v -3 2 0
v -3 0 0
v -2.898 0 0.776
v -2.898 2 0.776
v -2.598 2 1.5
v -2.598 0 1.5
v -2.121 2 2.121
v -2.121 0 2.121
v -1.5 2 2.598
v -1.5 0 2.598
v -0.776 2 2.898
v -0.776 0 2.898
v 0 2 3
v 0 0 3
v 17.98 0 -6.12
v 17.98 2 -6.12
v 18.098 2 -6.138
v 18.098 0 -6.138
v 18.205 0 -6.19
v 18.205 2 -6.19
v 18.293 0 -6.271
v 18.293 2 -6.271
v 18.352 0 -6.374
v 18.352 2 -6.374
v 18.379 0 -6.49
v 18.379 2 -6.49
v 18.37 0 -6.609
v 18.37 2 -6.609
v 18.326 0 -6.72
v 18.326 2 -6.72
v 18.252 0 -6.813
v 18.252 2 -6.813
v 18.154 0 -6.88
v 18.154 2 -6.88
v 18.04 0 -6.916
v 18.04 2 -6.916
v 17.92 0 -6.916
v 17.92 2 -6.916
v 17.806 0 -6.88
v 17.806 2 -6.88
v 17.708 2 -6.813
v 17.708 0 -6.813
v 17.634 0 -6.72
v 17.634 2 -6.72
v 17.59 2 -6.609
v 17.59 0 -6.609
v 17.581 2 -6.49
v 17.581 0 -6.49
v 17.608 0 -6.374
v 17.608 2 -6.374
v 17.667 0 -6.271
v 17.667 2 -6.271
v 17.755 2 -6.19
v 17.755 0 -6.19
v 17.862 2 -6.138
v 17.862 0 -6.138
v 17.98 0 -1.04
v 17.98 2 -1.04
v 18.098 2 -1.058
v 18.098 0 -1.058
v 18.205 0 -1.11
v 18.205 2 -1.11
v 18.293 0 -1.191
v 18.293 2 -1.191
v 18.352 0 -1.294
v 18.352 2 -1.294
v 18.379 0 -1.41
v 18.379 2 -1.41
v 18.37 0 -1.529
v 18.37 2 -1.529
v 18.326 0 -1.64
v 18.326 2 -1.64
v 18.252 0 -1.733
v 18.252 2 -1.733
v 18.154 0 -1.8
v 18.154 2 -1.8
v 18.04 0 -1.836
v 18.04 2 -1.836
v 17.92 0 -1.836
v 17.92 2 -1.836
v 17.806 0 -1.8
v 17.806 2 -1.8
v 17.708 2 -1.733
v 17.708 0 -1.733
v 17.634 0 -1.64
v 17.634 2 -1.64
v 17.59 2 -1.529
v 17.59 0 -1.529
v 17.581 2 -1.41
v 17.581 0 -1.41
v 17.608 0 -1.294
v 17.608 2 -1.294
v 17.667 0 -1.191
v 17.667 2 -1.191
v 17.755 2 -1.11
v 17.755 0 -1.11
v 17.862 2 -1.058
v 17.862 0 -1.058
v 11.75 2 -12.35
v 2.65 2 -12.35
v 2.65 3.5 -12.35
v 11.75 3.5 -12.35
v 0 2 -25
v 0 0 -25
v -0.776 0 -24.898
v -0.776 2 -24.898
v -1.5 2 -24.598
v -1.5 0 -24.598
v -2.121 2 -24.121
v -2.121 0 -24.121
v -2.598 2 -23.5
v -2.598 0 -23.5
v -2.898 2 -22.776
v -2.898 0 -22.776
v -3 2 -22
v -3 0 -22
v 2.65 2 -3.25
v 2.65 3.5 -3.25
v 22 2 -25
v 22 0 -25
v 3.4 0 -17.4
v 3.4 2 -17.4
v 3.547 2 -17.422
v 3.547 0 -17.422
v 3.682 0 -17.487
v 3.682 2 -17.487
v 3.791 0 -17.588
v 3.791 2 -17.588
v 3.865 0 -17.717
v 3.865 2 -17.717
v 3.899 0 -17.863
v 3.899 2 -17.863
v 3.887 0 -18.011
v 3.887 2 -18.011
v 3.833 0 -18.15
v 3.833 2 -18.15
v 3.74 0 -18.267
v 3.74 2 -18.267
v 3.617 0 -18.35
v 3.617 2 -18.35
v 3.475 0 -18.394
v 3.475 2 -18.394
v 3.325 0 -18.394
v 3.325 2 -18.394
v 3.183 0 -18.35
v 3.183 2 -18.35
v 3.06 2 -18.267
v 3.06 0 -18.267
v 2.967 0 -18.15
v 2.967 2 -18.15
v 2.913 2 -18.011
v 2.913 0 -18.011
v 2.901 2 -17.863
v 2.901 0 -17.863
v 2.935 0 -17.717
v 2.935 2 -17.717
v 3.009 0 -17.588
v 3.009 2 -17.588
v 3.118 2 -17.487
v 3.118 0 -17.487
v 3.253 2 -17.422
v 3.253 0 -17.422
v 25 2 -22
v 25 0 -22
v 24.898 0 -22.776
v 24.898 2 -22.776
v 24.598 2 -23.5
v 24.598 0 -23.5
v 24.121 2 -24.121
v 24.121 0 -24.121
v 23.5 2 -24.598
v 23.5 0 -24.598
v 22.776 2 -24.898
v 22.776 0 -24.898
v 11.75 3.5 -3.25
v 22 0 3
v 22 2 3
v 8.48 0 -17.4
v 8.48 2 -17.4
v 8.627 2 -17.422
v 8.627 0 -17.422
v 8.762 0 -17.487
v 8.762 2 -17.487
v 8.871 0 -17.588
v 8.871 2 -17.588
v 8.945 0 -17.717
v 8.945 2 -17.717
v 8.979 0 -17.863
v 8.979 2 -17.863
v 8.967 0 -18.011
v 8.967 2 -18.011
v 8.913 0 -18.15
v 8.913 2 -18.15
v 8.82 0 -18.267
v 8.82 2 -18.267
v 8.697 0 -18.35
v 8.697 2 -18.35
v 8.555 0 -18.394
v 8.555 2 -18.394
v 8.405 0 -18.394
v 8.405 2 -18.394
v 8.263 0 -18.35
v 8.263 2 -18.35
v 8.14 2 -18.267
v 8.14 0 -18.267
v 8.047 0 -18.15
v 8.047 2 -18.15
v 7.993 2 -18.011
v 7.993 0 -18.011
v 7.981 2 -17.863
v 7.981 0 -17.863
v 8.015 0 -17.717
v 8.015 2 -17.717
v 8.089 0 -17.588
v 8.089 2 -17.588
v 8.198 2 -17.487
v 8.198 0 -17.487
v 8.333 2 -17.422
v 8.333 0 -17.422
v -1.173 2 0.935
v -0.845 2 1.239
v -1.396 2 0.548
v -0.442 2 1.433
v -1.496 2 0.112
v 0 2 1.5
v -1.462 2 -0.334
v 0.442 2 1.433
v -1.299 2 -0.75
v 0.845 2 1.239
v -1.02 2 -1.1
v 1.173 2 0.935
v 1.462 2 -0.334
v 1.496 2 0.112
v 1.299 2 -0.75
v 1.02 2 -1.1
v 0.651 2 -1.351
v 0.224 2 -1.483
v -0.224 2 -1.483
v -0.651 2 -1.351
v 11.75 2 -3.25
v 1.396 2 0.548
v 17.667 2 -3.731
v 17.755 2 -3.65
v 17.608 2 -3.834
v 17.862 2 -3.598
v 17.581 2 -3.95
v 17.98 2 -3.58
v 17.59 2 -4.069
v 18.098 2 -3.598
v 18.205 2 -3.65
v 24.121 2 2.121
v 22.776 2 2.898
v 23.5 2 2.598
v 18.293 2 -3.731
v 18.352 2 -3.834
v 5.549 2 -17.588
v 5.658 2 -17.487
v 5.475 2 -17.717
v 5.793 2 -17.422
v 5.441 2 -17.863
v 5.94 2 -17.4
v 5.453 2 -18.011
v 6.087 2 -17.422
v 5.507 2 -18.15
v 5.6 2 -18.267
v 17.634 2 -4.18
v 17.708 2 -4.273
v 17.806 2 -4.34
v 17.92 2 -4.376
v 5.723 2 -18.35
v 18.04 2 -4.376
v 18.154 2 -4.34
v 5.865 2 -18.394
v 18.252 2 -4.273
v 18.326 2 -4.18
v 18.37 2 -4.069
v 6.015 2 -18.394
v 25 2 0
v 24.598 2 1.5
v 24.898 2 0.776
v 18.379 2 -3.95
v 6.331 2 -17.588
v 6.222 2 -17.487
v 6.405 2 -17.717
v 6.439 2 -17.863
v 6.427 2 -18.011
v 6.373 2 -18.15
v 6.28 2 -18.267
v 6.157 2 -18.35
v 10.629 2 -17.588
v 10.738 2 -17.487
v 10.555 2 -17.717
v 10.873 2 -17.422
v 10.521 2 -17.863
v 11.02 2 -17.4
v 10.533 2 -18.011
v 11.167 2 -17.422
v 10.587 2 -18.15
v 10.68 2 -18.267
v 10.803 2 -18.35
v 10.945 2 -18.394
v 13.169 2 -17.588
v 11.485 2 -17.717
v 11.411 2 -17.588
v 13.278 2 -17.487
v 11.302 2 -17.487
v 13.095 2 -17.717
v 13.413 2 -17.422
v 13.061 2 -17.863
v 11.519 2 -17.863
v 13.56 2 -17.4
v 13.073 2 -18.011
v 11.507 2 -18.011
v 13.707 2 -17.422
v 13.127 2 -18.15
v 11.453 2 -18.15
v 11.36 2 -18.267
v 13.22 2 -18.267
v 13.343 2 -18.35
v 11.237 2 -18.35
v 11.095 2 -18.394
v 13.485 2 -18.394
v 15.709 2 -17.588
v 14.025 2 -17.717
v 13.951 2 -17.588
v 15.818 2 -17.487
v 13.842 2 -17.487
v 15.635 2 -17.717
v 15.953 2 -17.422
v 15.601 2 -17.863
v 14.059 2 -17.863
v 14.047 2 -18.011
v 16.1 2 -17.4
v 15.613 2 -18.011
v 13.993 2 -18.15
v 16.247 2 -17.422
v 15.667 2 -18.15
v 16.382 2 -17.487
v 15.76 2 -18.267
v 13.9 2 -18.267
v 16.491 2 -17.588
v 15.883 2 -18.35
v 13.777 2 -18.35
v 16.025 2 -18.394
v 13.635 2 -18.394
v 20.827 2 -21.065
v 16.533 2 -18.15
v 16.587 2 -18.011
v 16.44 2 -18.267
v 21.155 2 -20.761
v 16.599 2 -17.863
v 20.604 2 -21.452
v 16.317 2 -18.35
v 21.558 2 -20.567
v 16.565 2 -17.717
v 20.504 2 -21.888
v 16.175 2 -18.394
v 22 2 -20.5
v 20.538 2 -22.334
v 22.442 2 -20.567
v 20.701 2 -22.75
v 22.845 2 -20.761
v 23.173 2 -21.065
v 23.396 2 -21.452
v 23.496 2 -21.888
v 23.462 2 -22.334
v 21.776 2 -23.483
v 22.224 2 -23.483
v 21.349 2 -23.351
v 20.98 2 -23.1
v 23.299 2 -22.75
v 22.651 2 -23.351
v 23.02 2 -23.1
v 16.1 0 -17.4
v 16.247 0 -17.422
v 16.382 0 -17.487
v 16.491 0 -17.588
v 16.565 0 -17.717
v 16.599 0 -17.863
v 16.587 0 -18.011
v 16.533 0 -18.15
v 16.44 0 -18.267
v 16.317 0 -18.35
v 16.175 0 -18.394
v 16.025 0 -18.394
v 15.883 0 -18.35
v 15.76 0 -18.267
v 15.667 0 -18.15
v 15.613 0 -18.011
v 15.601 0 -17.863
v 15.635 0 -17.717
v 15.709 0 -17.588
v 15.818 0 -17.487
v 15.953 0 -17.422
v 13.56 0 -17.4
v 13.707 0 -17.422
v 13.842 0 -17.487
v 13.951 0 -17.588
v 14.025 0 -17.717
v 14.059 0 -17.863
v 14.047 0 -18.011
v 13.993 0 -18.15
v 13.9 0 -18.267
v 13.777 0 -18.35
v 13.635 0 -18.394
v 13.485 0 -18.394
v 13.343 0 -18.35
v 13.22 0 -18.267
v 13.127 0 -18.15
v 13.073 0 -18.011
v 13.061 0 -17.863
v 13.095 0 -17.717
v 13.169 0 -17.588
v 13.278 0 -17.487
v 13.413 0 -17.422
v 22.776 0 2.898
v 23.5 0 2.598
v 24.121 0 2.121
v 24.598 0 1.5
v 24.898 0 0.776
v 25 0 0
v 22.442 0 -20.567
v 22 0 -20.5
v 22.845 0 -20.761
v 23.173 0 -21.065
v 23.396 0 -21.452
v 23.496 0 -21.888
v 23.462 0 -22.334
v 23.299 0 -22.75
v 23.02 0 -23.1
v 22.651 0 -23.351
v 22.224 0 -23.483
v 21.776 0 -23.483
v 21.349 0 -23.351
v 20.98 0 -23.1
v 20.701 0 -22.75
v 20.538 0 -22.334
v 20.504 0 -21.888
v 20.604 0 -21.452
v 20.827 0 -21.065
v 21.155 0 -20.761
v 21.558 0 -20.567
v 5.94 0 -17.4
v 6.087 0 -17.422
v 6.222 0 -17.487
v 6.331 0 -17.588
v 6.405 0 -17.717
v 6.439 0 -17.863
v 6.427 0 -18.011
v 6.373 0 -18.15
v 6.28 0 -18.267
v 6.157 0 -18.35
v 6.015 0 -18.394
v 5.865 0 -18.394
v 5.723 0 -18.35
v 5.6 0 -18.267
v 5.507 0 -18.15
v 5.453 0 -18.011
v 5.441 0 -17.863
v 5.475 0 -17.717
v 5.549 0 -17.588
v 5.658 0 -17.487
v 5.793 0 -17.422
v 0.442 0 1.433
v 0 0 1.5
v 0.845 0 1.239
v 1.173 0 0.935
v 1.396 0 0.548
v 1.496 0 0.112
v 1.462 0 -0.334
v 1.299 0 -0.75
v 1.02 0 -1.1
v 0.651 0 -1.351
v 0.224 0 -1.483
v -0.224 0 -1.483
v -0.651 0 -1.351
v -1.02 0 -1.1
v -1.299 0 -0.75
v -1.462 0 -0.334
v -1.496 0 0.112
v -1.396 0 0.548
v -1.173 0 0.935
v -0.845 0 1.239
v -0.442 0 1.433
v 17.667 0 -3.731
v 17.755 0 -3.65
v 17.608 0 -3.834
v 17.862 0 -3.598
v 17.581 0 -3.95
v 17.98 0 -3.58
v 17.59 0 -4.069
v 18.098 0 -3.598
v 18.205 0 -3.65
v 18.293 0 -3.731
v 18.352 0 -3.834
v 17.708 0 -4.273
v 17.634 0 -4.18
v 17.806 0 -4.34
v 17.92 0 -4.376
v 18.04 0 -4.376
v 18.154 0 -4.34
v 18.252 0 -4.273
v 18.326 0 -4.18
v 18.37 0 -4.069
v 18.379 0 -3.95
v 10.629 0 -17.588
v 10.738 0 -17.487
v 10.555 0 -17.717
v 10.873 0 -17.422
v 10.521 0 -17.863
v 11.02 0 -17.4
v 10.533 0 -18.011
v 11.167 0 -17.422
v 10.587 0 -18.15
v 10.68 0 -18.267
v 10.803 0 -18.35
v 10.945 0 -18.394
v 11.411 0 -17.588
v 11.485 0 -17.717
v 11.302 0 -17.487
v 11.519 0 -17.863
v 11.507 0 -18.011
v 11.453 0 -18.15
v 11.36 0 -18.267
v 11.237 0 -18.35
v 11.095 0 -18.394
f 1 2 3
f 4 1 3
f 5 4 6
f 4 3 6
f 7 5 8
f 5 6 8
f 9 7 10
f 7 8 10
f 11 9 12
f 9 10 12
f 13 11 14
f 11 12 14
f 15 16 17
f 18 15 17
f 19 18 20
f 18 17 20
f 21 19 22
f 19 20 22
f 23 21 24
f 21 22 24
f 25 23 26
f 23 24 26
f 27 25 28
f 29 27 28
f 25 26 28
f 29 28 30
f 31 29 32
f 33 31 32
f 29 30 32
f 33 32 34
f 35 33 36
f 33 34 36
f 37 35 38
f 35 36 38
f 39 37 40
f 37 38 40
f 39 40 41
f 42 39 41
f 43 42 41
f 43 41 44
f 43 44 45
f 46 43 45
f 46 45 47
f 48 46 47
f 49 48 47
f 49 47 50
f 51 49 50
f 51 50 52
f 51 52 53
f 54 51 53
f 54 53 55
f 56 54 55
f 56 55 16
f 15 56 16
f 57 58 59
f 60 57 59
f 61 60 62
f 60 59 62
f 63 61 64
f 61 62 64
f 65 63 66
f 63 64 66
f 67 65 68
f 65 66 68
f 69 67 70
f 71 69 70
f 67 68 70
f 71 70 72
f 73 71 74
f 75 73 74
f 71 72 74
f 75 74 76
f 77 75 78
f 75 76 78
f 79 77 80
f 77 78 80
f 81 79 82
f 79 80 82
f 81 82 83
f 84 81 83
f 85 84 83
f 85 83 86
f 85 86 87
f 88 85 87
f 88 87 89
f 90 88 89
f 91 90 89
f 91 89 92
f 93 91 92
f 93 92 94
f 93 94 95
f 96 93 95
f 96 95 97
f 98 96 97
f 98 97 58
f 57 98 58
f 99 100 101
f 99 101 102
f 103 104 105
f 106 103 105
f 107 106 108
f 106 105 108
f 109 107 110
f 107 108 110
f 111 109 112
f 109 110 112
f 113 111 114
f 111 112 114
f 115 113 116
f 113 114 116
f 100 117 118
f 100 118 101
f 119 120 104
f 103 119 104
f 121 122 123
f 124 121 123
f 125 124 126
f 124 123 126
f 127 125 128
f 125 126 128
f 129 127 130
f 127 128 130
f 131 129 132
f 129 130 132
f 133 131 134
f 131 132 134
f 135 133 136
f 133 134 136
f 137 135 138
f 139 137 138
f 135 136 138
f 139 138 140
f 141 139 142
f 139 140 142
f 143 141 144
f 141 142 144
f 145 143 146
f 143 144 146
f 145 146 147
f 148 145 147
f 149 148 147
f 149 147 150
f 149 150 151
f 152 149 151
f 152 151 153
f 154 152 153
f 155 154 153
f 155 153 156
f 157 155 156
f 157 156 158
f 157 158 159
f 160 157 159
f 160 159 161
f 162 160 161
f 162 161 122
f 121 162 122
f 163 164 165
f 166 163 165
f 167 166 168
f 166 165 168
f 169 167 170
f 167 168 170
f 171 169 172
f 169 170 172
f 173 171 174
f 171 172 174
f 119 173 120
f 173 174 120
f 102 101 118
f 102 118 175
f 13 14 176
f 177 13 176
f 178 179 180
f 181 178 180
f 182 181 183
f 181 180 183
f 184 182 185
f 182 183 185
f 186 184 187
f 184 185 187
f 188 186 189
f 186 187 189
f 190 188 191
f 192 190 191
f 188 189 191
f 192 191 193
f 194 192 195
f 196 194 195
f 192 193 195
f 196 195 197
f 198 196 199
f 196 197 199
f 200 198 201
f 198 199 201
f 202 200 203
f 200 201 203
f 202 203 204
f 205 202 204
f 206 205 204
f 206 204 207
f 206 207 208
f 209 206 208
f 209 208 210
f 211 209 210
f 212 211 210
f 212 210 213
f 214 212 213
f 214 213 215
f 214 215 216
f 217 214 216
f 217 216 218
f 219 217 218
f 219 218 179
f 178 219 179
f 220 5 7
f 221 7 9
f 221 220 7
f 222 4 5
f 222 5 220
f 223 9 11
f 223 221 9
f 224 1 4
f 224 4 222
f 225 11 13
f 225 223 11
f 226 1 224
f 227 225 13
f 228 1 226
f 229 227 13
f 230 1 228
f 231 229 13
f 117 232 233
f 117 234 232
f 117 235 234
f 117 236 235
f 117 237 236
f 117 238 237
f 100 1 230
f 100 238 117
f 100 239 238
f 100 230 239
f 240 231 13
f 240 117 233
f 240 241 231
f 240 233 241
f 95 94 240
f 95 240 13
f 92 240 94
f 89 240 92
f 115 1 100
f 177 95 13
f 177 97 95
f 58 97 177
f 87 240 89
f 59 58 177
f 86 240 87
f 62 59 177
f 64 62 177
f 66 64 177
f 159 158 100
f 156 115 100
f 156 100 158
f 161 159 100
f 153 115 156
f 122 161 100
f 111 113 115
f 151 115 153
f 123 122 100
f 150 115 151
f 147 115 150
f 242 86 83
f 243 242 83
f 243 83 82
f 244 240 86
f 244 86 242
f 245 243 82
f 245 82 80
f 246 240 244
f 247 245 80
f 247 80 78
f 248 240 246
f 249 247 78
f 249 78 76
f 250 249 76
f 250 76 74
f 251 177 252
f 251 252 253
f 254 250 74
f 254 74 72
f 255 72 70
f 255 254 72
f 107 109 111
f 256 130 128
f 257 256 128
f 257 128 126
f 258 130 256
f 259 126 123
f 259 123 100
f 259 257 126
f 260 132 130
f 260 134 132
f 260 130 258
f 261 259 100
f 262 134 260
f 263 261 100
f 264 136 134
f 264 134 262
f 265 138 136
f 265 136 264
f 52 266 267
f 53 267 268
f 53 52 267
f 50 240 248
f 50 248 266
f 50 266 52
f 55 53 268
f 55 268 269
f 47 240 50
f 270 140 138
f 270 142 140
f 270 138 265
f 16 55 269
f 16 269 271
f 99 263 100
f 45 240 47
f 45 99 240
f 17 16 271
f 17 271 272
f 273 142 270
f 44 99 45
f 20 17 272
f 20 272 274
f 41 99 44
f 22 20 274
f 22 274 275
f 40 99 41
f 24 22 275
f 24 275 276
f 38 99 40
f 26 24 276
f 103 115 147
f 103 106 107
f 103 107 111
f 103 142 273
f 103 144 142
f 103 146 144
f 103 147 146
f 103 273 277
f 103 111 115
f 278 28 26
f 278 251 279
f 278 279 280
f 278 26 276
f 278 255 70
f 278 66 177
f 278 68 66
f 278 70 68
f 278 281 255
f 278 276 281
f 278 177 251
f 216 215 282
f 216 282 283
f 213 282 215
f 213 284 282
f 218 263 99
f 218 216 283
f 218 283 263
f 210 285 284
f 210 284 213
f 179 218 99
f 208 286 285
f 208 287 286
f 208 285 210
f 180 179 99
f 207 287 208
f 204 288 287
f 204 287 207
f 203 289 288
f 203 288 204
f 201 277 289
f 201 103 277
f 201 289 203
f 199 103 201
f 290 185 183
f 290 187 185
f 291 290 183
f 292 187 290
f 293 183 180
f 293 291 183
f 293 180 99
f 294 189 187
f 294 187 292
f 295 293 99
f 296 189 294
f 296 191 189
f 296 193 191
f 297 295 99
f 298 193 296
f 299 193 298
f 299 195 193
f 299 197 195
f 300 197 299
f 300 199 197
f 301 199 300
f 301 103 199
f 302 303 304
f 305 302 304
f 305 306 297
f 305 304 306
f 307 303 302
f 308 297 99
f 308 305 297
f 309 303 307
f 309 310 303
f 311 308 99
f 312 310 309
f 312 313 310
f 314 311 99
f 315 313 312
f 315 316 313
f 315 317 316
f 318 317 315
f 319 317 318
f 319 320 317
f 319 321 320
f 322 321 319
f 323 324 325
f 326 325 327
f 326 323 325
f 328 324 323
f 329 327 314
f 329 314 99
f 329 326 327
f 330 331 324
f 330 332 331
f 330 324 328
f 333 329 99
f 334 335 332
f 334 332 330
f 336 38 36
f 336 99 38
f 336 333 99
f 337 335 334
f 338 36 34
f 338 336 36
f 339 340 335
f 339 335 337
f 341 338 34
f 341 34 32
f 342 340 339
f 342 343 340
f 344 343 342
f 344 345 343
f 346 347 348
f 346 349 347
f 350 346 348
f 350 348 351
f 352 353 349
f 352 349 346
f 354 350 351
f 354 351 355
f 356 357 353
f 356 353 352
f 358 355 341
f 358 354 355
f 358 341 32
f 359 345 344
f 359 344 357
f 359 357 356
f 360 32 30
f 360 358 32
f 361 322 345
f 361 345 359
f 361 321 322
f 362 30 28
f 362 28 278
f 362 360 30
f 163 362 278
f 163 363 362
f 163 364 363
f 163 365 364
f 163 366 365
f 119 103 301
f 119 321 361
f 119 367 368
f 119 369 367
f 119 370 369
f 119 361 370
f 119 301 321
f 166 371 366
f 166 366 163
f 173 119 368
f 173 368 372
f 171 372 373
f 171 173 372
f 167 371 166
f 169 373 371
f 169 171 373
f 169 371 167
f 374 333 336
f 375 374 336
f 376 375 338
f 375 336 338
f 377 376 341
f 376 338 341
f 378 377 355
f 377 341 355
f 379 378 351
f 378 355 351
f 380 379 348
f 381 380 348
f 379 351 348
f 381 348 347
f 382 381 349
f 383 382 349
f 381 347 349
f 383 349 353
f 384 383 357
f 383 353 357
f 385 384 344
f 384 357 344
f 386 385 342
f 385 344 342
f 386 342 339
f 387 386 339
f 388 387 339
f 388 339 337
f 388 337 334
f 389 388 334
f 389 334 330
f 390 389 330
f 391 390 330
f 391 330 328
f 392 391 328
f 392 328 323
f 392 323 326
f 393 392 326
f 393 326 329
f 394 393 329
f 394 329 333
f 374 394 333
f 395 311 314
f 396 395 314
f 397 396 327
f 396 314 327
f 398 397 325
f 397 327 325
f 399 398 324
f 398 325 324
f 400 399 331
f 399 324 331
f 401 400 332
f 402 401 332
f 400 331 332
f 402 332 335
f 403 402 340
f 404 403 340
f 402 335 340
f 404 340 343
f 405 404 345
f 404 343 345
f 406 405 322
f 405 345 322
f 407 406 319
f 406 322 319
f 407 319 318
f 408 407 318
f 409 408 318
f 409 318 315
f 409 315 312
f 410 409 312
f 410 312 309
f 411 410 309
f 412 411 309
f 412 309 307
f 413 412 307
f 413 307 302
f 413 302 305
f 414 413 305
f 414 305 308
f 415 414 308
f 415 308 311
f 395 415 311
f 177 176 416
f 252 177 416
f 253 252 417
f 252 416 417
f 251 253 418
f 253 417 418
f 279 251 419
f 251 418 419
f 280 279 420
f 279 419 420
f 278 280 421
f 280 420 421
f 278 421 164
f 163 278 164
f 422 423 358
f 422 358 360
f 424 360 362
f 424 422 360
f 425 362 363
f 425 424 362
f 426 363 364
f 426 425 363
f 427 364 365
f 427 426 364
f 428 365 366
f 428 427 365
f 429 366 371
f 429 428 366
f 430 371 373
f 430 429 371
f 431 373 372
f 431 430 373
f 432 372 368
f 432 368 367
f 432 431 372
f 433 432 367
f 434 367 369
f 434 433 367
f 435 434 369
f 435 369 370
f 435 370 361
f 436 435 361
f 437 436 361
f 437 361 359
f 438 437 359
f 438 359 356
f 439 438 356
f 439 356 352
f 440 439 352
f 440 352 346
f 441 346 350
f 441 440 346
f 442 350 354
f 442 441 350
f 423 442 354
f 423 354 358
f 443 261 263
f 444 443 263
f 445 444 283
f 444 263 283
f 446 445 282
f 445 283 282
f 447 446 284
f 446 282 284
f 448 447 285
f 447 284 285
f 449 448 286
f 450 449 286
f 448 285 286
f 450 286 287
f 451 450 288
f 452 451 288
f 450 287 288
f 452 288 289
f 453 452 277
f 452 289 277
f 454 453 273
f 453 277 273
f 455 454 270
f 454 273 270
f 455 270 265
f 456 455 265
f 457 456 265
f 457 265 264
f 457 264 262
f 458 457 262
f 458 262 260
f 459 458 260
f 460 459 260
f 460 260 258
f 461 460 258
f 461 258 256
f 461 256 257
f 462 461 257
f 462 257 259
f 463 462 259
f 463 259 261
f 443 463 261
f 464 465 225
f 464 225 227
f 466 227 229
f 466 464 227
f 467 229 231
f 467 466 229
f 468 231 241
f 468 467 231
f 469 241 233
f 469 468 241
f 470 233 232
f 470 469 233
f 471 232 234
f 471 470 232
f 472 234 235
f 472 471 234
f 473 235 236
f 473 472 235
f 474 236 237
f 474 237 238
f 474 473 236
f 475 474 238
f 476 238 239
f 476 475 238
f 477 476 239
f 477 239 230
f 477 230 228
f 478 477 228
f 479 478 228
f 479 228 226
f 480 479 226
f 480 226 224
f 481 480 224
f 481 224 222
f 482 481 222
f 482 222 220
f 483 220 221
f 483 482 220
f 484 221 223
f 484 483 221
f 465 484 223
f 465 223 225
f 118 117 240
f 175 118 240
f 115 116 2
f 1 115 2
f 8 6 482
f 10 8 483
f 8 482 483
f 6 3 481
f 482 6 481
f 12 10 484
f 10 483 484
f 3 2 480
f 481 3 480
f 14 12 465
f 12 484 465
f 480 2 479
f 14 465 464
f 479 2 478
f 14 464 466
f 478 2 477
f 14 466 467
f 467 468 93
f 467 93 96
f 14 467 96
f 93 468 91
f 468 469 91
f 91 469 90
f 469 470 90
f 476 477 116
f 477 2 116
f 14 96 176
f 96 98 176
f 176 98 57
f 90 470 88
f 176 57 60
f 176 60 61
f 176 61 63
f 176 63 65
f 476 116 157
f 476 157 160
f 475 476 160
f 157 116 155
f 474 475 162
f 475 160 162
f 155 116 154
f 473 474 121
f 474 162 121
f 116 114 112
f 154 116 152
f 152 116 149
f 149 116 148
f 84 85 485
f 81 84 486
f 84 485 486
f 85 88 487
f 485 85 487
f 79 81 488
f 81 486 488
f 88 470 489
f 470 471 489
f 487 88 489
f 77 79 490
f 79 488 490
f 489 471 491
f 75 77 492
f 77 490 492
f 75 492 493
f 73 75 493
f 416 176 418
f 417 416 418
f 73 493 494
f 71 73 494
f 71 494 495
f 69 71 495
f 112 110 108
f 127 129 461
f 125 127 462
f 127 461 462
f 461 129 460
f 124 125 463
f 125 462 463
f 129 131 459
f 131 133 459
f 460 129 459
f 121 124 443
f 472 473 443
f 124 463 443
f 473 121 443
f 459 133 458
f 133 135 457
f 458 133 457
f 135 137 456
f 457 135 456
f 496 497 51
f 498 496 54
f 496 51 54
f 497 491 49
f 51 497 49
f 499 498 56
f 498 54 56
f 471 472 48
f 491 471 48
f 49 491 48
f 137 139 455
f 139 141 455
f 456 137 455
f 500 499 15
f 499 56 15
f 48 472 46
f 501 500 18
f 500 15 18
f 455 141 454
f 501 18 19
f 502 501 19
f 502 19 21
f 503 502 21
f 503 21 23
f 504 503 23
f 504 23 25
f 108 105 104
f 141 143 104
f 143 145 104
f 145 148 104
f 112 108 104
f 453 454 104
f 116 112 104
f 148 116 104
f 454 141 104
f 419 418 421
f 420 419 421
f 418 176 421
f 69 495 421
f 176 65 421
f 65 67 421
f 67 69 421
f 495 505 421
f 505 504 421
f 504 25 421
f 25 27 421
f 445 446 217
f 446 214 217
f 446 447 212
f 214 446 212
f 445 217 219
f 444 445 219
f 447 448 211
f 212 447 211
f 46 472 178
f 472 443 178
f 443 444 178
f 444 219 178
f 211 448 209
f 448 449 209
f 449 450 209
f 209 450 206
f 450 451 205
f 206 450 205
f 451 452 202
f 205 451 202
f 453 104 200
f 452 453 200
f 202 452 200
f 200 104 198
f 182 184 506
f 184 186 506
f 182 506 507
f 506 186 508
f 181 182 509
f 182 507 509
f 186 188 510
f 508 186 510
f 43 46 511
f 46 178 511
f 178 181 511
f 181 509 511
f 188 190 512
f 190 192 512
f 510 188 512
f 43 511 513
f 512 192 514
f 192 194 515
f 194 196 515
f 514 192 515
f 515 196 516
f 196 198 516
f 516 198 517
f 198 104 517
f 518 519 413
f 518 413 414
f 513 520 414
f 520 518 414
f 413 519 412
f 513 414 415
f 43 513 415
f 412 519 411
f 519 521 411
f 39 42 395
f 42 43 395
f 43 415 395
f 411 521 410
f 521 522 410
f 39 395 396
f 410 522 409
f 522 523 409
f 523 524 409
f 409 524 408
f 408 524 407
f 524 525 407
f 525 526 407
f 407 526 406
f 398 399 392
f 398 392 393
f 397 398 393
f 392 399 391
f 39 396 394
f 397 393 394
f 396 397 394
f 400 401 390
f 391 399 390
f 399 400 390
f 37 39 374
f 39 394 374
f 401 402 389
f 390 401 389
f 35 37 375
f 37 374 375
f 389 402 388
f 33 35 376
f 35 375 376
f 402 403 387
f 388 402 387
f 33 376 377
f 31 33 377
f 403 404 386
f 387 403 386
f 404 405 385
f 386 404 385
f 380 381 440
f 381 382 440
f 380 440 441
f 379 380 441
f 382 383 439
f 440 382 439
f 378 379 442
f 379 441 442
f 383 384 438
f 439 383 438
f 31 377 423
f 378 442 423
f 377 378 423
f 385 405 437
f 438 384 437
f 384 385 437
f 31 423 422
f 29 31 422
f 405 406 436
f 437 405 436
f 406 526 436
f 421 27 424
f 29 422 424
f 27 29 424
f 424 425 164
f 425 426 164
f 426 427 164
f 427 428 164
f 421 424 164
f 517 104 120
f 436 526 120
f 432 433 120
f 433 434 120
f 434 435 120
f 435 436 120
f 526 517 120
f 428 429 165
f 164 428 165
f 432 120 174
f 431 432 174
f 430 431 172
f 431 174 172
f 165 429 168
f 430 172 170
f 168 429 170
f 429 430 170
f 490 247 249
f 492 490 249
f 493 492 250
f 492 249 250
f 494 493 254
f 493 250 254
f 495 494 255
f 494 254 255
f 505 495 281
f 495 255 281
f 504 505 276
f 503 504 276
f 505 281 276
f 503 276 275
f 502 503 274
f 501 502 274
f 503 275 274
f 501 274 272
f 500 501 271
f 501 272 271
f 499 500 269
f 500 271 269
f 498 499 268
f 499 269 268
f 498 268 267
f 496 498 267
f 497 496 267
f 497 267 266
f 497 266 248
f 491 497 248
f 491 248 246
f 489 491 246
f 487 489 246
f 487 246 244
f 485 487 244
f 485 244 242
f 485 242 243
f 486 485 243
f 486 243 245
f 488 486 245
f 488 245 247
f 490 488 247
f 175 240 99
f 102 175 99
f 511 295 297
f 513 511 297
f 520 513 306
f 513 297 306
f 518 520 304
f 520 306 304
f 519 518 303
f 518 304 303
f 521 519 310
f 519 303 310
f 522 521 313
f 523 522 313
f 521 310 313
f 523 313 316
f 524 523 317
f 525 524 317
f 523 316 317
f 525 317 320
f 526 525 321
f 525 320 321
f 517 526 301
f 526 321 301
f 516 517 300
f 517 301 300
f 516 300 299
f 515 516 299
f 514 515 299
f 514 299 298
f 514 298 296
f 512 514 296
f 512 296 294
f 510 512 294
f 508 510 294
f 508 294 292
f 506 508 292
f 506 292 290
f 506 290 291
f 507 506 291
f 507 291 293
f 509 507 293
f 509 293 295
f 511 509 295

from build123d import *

# Parameters (mm, degrees)
ESQUISSE2_R             = 1.5
BOSS_EXTRU_1_DEPTH      = 2
ENL_V_MAT_EXTRU_1_REACH = 37.412
ESQUISSE3_R             = 0.5
ESQUISSE4_W             = 9.1
ESQUISSE4_H             = 9.1
BOSS_EXTRU_2_DEPTH      = 1.5
ENL_V_MAT_EXTRU_2_REACH = 37.412
ESQUISSE5_R             = 0.4


with BuildPart() as part:
    # Esquisse2 → Boss.-Extru.1 (new body)
    with BuildSketch(Plane(origin=(0, 0, 0), x_dir=(1, 0, 0), z_dir=(0, 1, 0))):
        with BuildLine():
            Line((0, -3), (22, -3))
            ThreePointArc((22, -3), (24.121320344, -2.121320344), (25, 0))
            Line((25, 0), (25, 22))
            ThreePointArc((25, 22), (24.121320344, 24.121320344), (22, 25))
            Line((22, 25), (0, 25))
            ThreePointArc((0, 25), (-2.121320344, 24.121320344), (-3, 22))
            Line((-3, 22), (-3, 0))
            ThreePointArc((-3, 0), (-2.121320344, -2.121320344), (0, -3))
        make_face()
        with Locations(Location((0, 0, 0), (0, 0, 270))):
            Circle(ESQUISSE2_R, mode=Mode.SUBTRACT)
        with Locations(Location((22, 22, 0), (0, 0, 270))):
            Circle(ESQUISSE2_R, mode=Mode.SUBTRACT)
    extrude(amount=BOSS_EXTRU_1_DEPTH)

    # Esquisse3 → Enlèv. mat.-Extru.1 (cut, up to next)
    with BuildSketch(Plane(origin=(0, 2, 0), x_dir=(1, 0, 0), z_dir=(0, 1, 0)), mode=Mode.PRIVATE) as enl_v_mat_extru_1_sk1:
        with Locations(Location((5.94, 17.9, 0), (0, 0, 270))):
            Circle(ESQUISSE3_R)
    enl_v_mat_extru_1_tool1 = extrude(enl_v_mat_extru_1_sk1.sketch, amount=-ENL_V_MAT_EXTRU_1_REACH, mode=Mode.PRIVATE) & part.part
    # Esquisse3 → Enlèv. mat.-Extru.1 (cut, up to next)
    with BuildSketch(Plane(origin=(0, 2, 0), x_dir=(1, 0, 0), z_dir=(0, 1, 0)), mode=Mode.PRIVATE) as enl_v_mat_extru_1_sk2:
        with Locations(Location((8.48, 17.9, 0), (0, 0, 270))):
            Circle(ESQUISSE3_R)
    enl_v_mat_extru_1_tool2 = extrude(enl_v_mat_extru_1_sk2.sketch, amount=-ENL_V_MAT_EXTRU_1_REACH, mode=Mode.PRIVATE) & part.part
    # Esquisse3 → Enlèv. mat.-Extru.1 (cut, up to next)
    with BuildSketch(Plane(origin=(0, 2, 0), x_dir=(1, 0, 0), z_dir=(0, 1, 0)), mode=Mode.PRIVATE) as enl_v_mat_extru_1_sk3:
        with Locations(Location((11.02, 17.9, 0), (0, 0, 270))):
            Circle(ESQUISSE3_R)
    enl_v_mat_extru_1_tool3 = extrude(enl_v_mat_extru_1_sk3.sketch, amount=-ENL_V_MAT_EXTRU_1_REACH, mode=Mode.PRIVATE) & part.part
    # Esquisse3 → Enlèv. mat.-Extru.1 (cut, up to next)
    with BuildSketch(Plane(origin=(0, 2, 0), x_dir=(1, 0, 0), z_dir=(0, 1, 0)), mode=Mode.PRIVATE) as enl_v_mat_extru_1_sk4:
        with Locations(Location((13.56, 17.9, 0), (0, 0, 270))):
            Circle(ESQUISSE3_R)
    enl_v_mat_extru_1_tool4 = extrude(enl_v_mat_extru_1_sk4.sketch, amount=-ENL_V_MAT_EXTRU_1_REACH, mode=Mode.PRIVATE) & part.part
    # Esquisse3 → Enlèv. mat.-Extru.1 (cut, up to next)
    with BuildSketch(Plane(origin=(0, 2, 0), x_dir=(1, 0, 0), z_dir=(0, 1, 0)), mode=Mode.PRIVATE) as enl_v_mat_extru_1_sk5:
        with Locations(Location((16.1, 17.9, 0), (0, 0, 270))):
            Circle(ESQUISSE3_R)
    enl_v_mat_extru_1_tool5 = extrude(enl_v_mat_extru_1_sk5.sketch, amount=-ENL_V_MAT_EXTRU_1_REACH, mode=Mode.PRIVATE) & part.part
    # Esquisse3 → Enlèv. mat.-Extru.1 (cut, up to next)
    with BuildSketch(Plane(origin=(0, 2, 0), x_dir=(1, 0, 0), z_dir=(0, 1, 0)), mode=Mode.PRIVATE) as enl_v_mat_extru_1_sk6:
        with Locations(Location((3.4, 17.9, 0), (0, 0, 270))):
            Circle(ESQUISSE3_R)
    enl_v_mat_extru_1_tool6 = extrude(enl_v_mat_extru_1_sk6.sketch, amount=-ENL_V_MAT_EXTRU_1_REACH, mode=Mode.PRIVATE) & part.part
    add(enl_v_mat_extru_1_tool1.solids().sort_by_distance((5.94, 2, -17.9))[0], mode=Mode.SUBTRACT)
    add(enl_v_mat_extru_1_tool2.solids().sort_by_distance((8.48, 2, -17.9))[0], mode=Mode.SUBTRACT)
    add(enl_v_mat_extru_1_tool3.solids().sort_by_distance((11.02, 2, -17.9))[0], mode=Mode.SUBTRACT)
    add(enl_v_mat_extru_1_tool4.solids().sort_by_distance((13.56, 2, -17.9))[0], mode=Mode.SUBTRACT)
    add(enl_v_mat_extru_1_tool5.solids().sort_by_distance((16.1, 2, -17.9))[0], mode=Mode.SUBTRACT)
    add(enl_v_mat_extru_1_tool6.solids().sort_by_distance((3.4, 2, -17.9))[0], mode=Mode.SUBTRACT)

    # Esquisse4 → Boss.-Extru.2 (add)
    with BuildSketch(Plane(origin=(0, 2, 0), x_dir=(1, 0, 0), z_dir=(0, 1, 0))):
        with Locations((7.2, 7.8)):
            Rectangle(ESQUISSE4_W, ESQUISSE4_H)
    extrude(amount=BOSS_EXTRU_2_DEPTH)

    # Esquisse5 → Enlèv. mat.-Extru.2 (cut, up to next)
    with BuildSketch(Plane(origin=(0, 2, 0), x_dir=(1, 0, 0), z_dir=(0, 1, 0)), mode=Mode.PRIVATE) as enl_v_mat_extru_2_sk1:
        with Locations(Location((17.98, 1.44, 0), (0, 0, 270))):
            Circle(ESQUISSE5_R)
    enl_v_mat_extru_2_tool1 = extrude(enl_v_mat_extru_2_sk1.sketch, amount=-ENL_V_MAT_EXTRU_2_REACH, mode=Mode.PRIVATE) & part.part
    # Esquisse5 → Enlèv. mat.-Extru.2 (cut, up to next)
    with BuildSketch(Plane(origin=(0, 2, 0), x_dir=(1, 0, 0), z_dir=(0, 1, 0)), mode=Mode.PRIVATE) as enl_v_mat_extru_2_sk2:
        with Locations(Location((17.98, 3.98, 0), (0, 0, 270))):
            Circle(ESQUISSE5_R)
    enl_v_mat_extru_2_tool2 = extrude(enl_v_mat_extru_2_sk2.sketch, amount=-ENL_V_MAT_EXTRU_2_REACH, mode=Mode.PRIVATE) & part.part
    # Esquisse5 → Enlèv. mat.-Extru.2 (cut, up to next)
    with BuildSketch(Plane(origin=(0, 2, 0), x_dir=(1, 0, 0), z_dir=(0, 1, 0)), mode=Mode.PRIVATE) as enl_v_mat_extru_2_sk3:
        with Locations(Location((17.98, 6.52, 0), (0, 0, 270))):
            Circle(ESQUISSE5_R)
    enl_v_mat_extru_2_tool3 = extrude(enl_v_mat_extru_2_sk3.sketch, amount=-ENL_V_MAT_EXTRU_2_REACH, mode=Mode.PRIVATE) & part.part
    add(enl_v_mat_extru_2_tool1.solids().sort_by_distance((17.98, 2, -1.44))[0], mode=Mode.SUBTRACT)
    add(enl_v_mat_extru_2_tool2.solids().sort_by_distance((17.98, 2, -3.98))[0], mode=Mode.SUBTRACT)
    add(enl_v_mat_extru_2_tool3.solids().sort_by_distance((17.98, 2, -6.52))[0], mode=Mode.SUBTRACT)


solid = part.part
